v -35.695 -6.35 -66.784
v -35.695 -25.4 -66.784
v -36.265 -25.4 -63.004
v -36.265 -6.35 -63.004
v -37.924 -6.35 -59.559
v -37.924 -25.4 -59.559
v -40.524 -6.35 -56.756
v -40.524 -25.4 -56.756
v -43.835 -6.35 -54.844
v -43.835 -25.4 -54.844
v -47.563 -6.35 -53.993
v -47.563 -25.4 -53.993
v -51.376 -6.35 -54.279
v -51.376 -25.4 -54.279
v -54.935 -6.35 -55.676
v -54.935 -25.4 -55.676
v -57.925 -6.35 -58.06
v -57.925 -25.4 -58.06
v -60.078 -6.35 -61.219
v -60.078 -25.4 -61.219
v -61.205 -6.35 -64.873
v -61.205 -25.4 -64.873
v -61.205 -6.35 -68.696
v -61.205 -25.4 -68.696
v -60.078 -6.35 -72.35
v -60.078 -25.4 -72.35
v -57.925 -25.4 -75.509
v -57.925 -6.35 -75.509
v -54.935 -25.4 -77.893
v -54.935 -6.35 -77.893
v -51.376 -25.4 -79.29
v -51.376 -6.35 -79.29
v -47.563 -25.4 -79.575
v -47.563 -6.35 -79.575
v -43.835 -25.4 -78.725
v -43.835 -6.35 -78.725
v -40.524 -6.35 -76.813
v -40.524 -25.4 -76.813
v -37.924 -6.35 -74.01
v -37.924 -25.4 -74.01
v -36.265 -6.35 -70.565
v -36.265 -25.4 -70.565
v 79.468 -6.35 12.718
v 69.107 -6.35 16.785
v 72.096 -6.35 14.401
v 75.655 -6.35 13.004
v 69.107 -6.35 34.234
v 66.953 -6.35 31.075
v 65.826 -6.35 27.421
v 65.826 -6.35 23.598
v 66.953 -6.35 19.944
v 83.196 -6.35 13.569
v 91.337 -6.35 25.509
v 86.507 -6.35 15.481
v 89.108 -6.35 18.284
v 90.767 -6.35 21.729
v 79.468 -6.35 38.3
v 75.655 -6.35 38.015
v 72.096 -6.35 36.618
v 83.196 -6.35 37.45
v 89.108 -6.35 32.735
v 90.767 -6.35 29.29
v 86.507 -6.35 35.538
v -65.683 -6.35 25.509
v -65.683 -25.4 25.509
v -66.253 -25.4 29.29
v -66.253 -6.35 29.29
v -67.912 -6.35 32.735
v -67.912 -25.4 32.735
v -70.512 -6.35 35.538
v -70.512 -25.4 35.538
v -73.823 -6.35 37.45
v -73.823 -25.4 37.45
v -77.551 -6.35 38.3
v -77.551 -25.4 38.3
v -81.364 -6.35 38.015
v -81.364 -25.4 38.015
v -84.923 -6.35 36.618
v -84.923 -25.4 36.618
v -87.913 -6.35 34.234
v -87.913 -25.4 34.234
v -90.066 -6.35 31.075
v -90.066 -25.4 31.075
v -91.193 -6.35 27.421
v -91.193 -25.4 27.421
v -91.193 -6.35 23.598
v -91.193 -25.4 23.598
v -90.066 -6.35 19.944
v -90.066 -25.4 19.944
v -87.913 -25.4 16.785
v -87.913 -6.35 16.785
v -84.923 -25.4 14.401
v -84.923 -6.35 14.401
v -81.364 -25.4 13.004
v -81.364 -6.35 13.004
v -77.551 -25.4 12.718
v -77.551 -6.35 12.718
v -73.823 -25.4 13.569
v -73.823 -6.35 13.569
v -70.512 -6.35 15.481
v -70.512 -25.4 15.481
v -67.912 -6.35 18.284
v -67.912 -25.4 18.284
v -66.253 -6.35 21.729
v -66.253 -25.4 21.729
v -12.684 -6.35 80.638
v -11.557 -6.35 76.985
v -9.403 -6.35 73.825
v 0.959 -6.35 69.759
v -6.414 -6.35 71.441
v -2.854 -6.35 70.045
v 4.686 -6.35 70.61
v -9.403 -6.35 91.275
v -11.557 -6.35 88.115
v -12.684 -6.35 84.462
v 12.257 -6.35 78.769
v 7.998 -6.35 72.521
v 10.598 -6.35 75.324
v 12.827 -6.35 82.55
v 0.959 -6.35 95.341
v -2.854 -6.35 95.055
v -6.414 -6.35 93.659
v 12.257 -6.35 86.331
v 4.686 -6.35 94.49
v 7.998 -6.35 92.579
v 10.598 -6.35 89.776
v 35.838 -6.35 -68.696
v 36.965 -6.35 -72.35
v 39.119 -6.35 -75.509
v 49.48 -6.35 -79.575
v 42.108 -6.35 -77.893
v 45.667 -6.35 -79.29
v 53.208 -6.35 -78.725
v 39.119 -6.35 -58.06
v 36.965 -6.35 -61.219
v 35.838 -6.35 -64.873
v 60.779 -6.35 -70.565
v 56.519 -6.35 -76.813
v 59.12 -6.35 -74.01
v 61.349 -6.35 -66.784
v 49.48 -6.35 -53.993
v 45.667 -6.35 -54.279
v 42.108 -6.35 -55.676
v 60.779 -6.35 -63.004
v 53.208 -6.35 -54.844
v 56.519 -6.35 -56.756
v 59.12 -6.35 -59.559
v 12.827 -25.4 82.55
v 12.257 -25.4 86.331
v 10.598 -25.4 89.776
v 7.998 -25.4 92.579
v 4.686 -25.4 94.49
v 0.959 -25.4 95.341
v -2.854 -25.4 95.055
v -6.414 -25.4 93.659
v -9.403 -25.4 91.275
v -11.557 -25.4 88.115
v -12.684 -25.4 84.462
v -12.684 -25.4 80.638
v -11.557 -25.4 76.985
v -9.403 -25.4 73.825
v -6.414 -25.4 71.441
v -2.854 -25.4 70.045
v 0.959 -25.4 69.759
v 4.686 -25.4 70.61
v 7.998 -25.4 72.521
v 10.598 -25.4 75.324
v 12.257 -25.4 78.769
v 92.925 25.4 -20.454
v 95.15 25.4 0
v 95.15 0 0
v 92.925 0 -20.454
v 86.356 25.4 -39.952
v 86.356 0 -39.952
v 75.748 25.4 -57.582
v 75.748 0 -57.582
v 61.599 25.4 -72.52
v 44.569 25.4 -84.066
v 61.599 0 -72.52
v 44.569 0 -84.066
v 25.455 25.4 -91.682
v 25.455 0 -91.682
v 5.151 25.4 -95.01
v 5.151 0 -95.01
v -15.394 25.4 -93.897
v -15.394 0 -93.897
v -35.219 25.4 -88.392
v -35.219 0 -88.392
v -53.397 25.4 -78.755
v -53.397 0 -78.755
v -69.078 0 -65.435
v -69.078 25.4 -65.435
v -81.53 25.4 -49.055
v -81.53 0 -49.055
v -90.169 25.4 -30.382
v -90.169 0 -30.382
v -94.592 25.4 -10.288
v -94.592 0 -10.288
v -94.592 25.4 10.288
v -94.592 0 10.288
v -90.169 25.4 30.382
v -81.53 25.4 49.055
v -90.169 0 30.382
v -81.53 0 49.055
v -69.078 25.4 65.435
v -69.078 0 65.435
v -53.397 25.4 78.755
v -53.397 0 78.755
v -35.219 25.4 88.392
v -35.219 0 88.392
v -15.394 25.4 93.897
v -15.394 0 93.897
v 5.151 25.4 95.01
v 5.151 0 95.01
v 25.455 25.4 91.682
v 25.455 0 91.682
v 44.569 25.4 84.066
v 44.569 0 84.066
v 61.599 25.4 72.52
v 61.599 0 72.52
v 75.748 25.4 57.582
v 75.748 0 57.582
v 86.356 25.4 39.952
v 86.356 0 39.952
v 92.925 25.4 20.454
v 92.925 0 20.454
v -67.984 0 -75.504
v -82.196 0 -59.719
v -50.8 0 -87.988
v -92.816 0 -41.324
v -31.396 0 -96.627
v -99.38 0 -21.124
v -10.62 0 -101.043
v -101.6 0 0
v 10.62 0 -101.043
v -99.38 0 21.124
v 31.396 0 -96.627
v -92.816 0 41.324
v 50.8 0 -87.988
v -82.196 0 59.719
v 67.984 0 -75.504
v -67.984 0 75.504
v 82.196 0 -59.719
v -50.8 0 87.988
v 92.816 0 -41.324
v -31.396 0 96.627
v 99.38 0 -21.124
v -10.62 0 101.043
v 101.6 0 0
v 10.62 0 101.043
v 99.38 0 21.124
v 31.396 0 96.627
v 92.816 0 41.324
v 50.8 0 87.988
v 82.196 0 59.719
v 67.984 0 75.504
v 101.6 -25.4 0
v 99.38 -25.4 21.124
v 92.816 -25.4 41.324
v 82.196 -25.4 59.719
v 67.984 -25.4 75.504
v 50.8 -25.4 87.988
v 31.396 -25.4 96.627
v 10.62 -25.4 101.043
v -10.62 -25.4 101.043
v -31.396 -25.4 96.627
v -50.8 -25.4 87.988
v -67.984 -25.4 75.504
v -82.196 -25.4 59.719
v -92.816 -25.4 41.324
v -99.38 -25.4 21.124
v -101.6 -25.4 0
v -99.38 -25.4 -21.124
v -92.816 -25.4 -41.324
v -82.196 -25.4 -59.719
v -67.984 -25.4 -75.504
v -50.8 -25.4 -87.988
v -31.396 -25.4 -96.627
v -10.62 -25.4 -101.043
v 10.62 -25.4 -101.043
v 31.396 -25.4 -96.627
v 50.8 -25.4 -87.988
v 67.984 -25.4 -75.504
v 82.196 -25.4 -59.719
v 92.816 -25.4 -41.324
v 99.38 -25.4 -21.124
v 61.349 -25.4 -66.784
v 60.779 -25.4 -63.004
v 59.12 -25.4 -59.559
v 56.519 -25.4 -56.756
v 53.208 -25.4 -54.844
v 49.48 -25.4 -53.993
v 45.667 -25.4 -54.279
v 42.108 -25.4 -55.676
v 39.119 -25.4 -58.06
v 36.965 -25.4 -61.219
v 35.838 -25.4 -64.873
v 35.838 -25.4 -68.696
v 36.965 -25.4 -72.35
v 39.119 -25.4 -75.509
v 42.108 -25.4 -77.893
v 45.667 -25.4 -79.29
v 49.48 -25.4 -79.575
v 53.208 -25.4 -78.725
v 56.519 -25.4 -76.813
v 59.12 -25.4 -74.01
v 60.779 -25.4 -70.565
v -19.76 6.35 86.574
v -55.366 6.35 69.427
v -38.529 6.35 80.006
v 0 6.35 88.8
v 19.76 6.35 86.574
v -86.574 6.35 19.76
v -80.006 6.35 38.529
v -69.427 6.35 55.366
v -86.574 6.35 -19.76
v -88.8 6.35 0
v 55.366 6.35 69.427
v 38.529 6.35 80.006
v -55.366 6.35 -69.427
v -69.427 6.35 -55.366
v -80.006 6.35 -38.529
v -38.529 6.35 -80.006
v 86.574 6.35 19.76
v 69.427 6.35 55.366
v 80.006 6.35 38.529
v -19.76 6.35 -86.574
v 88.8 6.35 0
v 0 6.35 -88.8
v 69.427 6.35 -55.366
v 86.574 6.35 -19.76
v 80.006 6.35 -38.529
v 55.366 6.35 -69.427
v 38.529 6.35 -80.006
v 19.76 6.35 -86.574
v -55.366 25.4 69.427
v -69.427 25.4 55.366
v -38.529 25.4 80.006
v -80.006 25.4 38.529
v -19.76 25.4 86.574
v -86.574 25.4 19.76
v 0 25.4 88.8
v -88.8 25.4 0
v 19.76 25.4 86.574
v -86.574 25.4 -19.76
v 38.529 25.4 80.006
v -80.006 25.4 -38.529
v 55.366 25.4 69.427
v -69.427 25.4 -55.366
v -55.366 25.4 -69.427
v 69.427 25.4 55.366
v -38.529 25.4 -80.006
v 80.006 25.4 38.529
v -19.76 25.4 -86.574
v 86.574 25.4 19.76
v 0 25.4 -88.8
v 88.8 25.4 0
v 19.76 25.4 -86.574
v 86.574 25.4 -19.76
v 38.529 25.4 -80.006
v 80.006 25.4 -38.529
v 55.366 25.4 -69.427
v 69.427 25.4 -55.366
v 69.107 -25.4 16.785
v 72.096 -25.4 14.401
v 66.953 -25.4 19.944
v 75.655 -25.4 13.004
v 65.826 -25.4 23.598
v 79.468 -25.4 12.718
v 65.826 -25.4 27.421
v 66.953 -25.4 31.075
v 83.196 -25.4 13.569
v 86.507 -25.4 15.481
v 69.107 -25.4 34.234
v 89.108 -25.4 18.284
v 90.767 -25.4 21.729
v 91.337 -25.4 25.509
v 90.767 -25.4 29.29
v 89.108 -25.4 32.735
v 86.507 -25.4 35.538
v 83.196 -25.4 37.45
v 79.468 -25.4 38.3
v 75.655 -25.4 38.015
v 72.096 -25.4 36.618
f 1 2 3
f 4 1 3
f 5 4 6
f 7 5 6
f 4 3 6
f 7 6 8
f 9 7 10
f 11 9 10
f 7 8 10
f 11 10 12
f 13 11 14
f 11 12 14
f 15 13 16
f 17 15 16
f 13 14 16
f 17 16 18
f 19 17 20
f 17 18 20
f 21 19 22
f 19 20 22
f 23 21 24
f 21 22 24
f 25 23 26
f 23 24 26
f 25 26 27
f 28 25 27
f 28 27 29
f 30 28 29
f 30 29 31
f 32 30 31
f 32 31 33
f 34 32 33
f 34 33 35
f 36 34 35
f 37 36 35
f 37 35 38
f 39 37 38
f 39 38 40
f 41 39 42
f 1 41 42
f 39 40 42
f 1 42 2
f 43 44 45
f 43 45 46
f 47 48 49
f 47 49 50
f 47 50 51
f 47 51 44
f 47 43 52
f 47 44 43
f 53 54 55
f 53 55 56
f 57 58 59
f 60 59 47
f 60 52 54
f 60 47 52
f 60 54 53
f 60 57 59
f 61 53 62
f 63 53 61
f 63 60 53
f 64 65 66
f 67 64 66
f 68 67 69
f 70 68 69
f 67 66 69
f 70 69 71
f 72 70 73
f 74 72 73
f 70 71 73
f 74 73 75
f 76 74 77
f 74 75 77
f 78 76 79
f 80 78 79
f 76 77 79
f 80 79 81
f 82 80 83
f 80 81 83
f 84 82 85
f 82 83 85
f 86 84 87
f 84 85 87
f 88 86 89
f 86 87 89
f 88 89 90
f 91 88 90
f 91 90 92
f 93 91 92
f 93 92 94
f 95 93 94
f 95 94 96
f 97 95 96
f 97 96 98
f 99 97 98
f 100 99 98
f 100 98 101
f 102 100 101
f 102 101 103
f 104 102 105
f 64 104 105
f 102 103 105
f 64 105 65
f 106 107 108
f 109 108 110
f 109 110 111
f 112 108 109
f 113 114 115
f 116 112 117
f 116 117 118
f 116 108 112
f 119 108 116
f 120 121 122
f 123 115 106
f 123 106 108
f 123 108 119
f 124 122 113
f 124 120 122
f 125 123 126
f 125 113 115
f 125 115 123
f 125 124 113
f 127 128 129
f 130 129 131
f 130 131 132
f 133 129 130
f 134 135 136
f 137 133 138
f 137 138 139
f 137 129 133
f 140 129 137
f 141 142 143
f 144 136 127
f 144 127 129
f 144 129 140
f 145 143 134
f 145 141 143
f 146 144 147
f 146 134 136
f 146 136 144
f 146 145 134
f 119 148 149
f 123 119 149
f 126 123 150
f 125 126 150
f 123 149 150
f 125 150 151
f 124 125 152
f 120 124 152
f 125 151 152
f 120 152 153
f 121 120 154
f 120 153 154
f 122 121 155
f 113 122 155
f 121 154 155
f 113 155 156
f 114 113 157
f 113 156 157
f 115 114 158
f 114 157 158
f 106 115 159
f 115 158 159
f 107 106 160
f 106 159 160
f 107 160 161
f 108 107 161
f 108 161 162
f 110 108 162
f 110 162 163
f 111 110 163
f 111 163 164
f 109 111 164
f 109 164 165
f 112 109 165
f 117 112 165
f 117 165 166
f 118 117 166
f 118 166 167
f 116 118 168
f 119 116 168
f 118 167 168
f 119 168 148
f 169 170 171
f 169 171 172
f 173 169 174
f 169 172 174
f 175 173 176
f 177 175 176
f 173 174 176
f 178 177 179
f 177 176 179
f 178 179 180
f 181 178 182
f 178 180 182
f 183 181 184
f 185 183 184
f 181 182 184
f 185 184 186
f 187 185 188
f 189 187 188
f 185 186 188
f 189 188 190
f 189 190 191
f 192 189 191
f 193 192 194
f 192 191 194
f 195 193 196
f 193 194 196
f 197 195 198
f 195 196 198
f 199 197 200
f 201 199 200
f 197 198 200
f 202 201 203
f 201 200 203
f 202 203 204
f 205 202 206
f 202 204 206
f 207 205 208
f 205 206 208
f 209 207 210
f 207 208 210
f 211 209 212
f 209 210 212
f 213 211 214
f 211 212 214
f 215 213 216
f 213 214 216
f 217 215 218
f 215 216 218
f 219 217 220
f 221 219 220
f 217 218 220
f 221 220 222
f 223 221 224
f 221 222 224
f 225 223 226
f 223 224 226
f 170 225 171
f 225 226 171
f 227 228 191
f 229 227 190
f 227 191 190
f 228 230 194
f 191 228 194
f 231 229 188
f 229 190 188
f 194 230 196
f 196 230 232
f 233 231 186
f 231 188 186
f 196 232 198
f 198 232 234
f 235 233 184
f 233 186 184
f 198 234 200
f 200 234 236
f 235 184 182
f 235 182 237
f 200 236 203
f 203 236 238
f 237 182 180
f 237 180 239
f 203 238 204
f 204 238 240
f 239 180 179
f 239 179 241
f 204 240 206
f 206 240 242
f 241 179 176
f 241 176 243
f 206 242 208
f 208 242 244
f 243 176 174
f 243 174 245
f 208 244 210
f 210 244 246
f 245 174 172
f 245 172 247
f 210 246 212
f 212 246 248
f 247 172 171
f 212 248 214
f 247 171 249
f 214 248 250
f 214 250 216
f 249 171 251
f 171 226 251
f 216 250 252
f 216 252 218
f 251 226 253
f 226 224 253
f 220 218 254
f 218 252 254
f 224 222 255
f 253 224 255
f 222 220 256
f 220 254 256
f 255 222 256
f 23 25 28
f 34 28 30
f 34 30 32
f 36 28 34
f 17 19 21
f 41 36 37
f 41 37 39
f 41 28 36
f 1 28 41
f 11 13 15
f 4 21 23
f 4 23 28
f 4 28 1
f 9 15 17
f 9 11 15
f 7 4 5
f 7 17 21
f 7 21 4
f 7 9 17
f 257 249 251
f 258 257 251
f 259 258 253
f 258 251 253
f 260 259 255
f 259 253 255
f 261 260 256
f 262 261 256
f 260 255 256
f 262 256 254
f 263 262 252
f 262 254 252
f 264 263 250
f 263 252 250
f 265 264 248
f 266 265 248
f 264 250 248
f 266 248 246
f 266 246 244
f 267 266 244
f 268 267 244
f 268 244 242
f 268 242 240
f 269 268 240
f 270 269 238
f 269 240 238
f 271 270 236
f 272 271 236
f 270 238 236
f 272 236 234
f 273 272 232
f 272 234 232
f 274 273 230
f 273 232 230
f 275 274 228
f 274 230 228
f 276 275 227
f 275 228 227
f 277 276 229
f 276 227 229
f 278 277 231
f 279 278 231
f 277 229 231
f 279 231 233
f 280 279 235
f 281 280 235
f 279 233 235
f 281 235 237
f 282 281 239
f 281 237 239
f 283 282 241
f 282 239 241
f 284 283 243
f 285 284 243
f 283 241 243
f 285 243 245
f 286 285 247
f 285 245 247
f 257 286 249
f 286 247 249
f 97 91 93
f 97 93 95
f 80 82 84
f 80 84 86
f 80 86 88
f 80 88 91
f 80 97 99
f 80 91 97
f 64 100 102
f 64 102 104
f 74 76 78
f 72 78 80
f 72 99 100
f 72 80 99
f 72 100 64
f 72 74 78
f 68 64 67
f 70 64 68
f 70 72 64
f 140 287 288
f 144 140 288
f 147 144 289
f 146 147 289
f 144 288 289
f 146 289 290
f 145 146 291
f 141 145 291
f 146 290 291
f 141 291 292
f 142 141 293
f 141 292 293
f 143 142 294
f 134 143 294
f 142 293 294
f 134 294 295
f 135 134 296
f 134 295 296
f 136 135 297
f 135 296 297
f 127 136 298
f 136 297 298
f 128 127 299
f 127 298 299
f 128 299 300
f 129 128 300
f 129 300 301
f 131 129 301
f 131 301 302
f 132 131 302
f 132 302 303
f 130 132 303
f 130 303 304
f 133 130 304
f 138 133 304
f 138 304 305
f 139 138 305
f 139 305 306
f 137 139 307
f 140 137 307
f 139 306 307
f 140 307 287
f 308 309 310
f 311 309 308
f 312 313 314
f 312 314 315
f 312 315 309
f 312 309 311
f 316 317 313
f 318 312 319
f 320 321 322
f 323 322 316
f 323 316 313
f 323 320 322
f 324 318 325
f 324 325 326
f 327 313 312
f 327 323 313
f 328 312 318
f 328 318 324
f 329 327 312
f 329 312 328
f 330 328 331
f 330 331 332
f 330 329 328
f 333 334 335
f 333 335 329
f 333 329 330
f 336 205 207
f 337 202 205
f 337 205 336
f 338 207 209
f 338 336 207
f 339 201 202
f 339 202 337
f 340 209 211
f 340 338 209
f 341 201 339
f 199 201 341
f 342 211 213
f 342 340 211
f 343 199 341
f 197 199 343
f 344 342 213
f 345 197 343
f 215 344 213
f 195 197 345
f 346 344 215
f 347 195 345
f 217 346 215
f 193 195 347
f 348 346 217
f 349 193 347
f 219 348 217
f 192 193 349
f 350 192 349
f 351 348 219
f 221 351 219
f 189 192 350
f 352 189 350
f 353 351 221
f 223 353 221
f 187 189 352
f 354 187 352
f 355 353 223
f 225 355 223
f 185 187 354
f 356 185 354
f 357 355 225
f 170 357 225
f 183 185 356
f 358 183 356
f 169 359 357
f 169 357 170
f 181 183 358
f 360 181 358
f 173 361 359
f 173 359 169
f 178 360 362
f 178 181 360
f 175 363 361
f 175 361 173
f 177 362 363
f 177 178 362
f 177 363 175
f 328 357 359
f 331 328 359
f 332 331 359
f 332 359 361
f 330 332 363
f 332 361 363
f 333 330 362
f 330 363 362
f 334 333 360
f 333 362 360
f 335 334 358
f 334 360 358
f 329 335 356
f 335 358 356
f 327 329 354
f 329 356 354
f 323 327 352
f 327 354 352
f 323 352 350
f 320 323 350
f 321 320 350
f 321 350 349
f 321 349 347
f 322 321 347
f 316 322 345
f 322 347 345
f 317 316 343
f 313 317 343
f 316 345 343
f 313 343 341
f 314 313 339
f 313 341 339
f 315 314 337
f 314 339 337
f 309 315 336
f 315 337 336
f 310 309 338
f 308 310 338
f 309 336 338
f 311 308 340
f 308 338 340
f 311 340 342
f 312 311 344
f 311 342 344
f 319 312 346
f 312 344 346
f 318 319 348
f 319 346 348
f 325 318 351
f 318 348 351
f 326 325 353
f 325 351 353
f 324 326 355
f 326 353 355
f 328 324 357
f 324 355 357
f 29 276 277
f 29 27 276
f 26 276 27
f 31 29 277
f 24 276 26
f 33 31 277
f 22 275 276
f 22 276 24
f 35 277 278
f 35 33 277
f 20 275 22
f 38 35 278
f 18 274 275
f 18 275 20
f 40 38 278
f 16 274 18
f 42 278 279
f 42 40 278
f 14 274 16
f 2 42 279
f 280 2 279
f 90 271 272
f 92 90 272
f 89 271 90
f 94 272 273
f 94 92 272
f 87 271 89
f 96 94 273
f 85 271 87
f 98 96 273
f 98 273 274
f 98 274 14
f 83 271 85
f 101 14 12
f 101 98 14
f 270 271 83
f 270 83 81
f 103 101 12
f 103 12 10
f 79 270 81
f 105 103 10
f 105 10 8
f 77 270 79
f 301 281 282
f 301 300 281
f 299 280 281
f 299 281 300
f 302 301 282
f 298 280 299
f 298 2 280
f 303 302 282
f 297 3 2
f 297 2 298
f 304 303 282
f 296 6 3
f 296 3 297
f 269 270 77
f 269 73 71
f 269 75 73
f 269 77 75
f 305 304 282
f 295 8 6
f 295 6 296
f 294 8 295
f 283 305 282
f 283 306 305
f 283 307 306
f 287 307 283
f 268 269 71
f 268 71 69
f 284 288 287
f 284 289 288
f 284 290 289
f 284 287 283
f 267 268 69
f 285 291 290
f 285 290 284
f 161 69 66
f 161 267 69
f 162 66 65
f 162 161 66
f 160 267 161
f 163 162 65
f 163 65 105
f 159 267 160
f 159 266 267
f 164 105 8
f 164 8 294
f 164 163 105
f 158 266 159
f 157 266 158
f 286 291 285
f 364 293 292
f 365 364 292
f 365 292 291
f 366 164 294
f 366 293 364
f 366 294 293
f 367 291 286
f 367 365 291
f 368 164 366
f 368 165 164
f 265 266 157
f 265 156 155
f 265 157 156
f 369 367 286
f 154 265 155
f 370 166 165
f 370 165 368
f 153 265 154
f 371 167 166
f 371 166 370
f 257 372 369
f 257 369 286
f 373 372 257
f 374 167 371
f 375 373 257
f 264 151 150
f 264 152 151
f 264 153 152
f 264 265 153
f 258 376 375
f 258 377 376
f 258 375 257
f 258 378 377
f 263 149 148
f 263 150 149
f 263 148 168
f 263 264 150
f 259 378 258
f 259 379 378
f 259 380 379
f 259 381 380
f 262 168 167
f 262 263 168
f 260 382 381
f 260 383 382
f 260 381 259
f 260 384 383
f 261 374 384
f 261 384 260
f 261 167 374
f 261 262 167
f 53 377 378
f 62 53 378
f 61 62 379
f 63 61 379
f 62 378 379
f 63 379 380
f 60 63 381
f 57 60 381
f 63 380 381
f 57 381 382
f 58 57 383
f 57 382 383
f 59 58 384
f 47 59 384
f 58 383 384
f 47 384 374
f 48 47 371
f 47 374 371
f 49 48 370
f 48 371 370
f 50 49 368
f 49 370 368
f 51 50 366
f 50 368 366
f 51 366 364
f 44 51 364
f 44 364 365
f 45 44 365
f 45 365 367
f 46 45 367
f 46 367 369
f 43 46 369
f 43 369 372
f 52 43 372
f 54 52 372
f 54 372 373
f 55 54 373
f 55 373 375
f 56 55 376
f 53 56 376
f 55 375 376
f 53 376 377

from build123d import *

# Parameters (mm, degrees)
SKETCH1_R           = 95.149999946
BOSS_EXTRUDE1_DEPTH = 25.4
SKETCH2_R           = 88.8
CUT_EXTRUDE1_DEPTH  = 19.05
SKETCH3_R           = 101.6
BOSS_EXTRUDE2_DEPTH = 25.4
SKETCH4_R           = 12.827
CUT_EXTRUDE2_DEPTH  = 19.05


with BuildPart() as part:
    # Sketch1 → Boss-Extrude1 (new body)
    with BuildSketch(Plane(origin=(0, 0, 0), x_dir=(1, 0, 0), z_dir=(0, 1, 0))):
        Circle(SKETCH1_R)
    extrude(amount=BOSS_EXTRUDE1_DEPTH)

    # Sketch2 → Cut-Extrude1 (cut)
    with BuildSketch(Plane(origin=(0, 25.4, 0), x_dir=(1, 0, 0), z_dir=(0, 1, 0))):
        Circle(SKETCH2_R)
    extrude(amount=-CUT_EXTRUDE1_DEPTH, mode=Mode.SUBTRACT)

    # Sketch3 → Boss-Extrude2 (add)
    with BuildSketch(Plane.XZ):
        Circle(SKETCH3_R)
    extrude(amount=BOSS_EXTRUDE2_DEPTH)

    # Sketch4 → Cut-Extrude2 (cut)
    with BuildSketch(Plane.XZ.offset(25.4)):
        with Locations((0, 82.55)):
            Circle(SKETCH4_R)
        with Locations((78.50971542, 25.509352886)):
            Circle(SKETCH4_R)
        with Locations((48.521672577, -66.784352886)):
            Circle(SKETCH4_R)
        with Locations((-48.521672577, -66.784352886)):
            Circle(SKETCH4_R)
        with Locations((-78.50971542, 25.509352886)):
            Circle(SKETCH4_R)
    extrude(amount=-CUT_EXTRUDE2_DEPTH, mode=Mode.SUBTRACT)


solid = part.part
